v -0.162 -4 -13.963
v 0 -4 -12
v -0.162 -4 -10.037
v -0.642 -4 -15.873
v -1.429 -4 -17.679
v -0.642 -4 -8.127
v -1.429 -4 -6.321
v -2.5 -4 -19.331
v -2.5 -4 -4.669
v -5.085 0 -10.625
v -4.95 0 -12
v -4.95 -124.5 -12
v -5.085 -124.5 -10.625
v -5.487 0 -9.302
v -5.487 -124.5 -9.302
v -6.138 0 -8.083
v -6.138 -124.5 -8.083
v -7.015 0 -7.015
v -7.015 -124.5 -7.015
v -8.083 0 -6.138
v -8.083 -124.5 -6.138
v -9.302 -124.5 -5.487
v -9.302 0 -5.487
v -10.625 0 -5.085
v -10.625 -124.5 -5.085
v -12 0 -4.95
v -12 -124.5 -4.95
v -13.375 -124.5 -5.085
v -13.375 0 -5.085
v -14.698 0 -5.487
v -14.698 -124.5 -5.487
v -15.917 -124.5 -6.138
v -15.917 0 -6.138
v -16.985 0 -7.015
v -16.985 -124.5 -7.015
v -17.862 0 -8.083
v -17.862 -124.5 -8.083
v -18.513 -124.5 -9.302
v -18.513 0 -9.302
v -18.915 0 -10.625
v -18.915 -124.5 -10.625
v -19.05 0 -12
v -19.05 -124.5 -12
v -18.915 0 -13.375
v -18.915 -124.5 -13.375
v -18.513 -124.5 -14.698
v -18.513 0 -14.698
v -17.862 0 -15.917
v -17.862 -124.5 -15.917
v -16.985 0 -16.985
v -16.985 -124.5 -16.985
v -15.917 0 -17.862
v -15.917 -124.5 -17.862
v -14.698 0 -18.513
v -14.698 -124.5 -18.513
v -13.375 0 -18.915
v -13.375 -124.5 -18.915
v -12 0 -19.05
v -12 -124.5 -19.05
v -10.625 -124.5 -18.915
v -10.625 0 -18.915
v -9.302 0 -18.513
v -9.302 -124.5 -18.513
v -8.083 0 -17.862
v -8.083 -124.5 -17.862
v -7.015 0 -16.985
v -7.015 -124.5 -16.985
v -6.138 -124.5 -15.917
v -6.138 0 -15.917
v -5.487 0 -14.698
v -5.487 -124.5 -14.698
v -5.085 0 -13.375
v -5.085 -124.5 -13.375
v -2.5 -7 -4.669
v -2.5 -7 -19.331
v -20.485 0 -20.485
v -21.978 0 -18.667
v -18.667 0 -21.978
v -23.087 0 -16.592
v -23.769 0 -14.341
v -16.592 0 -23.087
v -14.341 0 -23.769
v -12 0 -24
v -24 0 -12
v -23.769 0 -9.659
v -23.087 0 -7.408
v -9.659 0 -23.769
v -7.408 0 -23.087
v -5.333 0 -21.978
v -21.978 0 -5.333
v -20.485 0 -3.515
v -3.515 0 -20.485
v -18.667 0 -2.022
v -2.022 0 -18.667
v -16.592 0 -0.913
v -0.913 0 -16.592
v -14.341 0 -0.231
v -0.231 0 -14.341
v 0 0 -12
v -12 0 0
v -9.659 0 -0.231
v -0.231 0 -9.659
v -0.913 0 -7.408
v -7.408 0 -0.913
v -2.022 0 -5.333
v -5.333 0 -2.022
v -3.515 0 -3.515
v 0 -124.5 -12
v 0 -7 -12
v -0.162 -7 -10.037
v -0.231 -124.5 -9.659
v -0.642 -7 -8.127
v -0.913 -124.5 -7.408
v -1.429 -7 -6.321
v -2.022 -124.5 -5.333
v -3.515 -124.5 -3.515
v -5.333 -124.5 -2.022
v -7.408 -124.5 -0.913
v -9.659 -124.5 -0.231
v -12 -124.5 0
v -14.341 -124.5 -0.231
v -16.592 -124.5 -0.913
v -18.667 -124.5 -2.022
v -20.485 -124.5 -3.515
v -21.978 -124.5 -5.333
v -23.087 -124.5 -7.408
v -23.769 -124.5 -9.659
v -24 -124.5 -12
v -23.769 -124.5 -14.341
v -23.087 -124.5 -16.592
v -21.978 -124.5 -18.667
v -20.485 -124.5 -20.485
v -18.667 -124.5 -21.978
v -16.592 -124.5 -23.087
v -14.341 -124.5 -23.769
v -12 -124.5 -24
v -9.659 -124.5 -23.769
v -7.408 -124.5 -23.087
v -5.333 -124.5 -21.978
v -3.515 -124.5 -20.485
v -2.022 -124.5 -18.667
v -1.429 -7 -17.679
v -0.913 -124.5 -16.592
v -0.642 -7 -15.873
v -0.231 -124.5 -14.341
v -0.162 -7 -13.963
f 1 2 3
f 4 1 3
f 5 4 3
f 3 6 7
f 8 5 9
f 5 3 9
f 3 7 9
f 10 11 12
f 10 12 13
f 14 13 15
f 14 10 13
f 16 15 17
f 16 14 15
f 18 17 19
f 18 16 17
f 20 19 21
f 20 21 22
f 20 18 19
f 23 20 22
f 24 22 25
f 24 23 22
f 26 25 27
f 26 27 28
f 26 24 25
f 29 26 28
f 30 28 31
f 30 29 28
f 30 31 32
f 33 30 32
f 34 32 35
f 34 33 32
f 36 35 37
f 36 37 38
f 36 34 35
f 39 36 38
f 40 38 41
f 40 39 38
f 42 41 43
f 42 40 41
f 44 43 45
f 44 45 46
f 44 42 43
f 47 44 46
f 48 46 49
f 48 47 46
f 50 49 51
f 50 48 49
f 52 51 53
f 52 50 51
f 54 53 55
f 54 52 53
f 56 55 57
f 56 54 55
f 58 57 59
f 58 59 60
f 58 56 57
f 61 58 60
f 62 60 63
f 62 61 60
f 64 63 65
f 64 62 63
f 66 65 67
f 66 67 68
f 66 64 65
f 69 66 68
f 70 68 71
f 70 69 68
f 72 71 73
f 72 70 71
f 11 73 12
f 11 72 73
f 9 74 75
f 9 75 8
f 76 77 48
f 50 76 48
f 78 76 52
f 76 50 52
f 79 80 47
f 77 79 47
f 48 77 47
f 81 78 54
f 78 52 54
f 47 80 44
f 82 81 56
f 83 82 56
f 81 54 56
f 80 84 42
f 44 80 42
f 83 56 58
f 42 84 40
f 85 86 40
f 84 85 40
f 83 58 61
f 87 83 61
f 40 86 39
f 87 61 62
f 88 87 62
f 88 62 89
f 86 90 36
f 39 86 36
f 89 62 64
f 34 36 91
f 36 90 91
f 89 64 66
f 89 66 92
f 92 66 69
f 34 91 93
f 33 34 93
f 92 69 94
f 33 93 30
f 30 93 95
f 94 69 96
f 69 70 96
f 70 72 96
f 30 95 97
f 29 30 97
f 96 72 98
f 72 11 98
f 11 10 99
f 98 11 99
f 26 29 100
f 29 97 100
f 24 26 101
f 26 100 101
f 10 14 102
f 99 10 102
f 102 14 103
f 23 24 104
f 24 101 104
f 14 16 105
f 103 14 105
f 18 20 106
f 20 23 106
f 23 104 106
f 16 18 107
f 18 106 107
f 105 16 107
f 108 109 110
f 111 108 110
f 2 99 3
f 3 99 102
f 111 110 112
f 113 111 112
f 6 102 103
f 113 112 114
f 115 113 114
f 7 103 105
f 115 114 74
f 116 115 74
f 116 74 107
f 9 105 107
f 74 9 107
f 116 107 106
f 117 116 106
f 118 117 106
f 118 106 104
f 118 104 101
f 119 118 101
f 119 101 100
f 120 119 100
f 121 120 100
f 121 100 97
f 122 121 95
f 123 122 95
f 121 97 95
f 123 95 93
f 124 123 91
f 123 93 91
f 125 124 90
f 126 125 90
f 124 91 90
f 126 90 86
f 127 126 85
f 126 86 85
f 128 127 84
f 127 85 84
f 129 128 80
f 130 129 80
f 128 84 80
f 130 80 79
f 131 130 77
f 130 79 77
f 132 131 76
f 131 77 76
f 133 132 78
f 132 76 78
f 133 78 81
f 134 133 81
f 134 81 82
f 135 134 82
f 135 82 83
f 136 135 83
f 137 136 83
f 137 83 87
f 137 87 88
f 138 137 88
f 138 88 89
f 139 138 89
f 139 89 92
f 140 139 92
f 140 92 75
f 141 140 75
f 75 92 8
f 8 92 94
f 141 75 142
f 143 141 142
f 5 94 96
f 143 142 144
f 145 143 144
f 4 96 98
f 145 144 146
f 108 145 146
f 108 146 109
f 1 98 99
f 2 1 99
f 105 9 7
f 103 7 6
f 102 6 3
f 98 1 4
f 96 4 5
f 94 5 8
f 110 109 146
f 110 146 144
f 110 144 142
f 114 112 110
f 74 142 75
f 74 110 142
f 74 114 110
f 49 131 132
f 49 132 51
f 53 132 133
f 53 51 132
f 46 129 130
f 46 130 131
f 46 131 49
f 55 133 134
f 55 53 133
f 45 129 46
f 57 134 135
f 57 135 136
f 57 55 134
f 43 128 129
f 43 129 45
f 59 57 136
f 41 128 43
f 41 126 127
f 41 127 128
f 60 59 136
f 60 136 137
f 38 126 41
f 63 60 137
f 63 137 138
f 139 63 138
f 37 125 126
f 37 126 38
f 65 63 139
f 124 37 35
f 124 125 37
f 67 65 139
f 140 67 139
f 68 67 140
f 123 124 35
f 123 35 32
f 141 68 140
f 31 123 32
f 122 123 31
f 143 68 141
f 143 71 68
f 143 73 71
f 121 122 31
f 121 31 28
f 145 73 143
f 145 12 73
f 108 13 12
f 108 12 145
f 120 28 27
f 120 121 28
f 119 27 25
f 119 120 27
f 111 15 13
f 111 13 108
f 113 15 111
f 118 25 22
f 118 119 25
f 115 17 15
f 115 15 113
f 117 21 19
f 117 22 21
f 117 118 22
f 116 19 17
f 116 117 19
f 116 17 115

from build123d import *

# Parameters (mm, degrees)
F0_R     = 12
F0_R_2   = 7.05
F1_DEPTH = 124.5
F2_W     = 3
F2_H     = 24
F3_DEPTH = 2.5


with BuildPart() as f1:
    # F0 (on Front) → F1 (new body)
    with BuildSketch(Plane.XZ):
        with Locations((-12, -12)):
            Circle(F0_R)
        with Locations((-12, -12)):
            Circle(F0_R_2, mode=Mode.SUBTRACT)
    extrude(amount=F1_DEPTH)

    # F2 (on Right) → F3 (cut)
    with BuildSketch(Plane.YZ):
        with Locations((-5.5, -12)):
            Rectangle(F2_W, F2_H)
    extrude(amount=-F3_DEPTH, mode=Mode.SUBTRACT)


solid = f1.part
